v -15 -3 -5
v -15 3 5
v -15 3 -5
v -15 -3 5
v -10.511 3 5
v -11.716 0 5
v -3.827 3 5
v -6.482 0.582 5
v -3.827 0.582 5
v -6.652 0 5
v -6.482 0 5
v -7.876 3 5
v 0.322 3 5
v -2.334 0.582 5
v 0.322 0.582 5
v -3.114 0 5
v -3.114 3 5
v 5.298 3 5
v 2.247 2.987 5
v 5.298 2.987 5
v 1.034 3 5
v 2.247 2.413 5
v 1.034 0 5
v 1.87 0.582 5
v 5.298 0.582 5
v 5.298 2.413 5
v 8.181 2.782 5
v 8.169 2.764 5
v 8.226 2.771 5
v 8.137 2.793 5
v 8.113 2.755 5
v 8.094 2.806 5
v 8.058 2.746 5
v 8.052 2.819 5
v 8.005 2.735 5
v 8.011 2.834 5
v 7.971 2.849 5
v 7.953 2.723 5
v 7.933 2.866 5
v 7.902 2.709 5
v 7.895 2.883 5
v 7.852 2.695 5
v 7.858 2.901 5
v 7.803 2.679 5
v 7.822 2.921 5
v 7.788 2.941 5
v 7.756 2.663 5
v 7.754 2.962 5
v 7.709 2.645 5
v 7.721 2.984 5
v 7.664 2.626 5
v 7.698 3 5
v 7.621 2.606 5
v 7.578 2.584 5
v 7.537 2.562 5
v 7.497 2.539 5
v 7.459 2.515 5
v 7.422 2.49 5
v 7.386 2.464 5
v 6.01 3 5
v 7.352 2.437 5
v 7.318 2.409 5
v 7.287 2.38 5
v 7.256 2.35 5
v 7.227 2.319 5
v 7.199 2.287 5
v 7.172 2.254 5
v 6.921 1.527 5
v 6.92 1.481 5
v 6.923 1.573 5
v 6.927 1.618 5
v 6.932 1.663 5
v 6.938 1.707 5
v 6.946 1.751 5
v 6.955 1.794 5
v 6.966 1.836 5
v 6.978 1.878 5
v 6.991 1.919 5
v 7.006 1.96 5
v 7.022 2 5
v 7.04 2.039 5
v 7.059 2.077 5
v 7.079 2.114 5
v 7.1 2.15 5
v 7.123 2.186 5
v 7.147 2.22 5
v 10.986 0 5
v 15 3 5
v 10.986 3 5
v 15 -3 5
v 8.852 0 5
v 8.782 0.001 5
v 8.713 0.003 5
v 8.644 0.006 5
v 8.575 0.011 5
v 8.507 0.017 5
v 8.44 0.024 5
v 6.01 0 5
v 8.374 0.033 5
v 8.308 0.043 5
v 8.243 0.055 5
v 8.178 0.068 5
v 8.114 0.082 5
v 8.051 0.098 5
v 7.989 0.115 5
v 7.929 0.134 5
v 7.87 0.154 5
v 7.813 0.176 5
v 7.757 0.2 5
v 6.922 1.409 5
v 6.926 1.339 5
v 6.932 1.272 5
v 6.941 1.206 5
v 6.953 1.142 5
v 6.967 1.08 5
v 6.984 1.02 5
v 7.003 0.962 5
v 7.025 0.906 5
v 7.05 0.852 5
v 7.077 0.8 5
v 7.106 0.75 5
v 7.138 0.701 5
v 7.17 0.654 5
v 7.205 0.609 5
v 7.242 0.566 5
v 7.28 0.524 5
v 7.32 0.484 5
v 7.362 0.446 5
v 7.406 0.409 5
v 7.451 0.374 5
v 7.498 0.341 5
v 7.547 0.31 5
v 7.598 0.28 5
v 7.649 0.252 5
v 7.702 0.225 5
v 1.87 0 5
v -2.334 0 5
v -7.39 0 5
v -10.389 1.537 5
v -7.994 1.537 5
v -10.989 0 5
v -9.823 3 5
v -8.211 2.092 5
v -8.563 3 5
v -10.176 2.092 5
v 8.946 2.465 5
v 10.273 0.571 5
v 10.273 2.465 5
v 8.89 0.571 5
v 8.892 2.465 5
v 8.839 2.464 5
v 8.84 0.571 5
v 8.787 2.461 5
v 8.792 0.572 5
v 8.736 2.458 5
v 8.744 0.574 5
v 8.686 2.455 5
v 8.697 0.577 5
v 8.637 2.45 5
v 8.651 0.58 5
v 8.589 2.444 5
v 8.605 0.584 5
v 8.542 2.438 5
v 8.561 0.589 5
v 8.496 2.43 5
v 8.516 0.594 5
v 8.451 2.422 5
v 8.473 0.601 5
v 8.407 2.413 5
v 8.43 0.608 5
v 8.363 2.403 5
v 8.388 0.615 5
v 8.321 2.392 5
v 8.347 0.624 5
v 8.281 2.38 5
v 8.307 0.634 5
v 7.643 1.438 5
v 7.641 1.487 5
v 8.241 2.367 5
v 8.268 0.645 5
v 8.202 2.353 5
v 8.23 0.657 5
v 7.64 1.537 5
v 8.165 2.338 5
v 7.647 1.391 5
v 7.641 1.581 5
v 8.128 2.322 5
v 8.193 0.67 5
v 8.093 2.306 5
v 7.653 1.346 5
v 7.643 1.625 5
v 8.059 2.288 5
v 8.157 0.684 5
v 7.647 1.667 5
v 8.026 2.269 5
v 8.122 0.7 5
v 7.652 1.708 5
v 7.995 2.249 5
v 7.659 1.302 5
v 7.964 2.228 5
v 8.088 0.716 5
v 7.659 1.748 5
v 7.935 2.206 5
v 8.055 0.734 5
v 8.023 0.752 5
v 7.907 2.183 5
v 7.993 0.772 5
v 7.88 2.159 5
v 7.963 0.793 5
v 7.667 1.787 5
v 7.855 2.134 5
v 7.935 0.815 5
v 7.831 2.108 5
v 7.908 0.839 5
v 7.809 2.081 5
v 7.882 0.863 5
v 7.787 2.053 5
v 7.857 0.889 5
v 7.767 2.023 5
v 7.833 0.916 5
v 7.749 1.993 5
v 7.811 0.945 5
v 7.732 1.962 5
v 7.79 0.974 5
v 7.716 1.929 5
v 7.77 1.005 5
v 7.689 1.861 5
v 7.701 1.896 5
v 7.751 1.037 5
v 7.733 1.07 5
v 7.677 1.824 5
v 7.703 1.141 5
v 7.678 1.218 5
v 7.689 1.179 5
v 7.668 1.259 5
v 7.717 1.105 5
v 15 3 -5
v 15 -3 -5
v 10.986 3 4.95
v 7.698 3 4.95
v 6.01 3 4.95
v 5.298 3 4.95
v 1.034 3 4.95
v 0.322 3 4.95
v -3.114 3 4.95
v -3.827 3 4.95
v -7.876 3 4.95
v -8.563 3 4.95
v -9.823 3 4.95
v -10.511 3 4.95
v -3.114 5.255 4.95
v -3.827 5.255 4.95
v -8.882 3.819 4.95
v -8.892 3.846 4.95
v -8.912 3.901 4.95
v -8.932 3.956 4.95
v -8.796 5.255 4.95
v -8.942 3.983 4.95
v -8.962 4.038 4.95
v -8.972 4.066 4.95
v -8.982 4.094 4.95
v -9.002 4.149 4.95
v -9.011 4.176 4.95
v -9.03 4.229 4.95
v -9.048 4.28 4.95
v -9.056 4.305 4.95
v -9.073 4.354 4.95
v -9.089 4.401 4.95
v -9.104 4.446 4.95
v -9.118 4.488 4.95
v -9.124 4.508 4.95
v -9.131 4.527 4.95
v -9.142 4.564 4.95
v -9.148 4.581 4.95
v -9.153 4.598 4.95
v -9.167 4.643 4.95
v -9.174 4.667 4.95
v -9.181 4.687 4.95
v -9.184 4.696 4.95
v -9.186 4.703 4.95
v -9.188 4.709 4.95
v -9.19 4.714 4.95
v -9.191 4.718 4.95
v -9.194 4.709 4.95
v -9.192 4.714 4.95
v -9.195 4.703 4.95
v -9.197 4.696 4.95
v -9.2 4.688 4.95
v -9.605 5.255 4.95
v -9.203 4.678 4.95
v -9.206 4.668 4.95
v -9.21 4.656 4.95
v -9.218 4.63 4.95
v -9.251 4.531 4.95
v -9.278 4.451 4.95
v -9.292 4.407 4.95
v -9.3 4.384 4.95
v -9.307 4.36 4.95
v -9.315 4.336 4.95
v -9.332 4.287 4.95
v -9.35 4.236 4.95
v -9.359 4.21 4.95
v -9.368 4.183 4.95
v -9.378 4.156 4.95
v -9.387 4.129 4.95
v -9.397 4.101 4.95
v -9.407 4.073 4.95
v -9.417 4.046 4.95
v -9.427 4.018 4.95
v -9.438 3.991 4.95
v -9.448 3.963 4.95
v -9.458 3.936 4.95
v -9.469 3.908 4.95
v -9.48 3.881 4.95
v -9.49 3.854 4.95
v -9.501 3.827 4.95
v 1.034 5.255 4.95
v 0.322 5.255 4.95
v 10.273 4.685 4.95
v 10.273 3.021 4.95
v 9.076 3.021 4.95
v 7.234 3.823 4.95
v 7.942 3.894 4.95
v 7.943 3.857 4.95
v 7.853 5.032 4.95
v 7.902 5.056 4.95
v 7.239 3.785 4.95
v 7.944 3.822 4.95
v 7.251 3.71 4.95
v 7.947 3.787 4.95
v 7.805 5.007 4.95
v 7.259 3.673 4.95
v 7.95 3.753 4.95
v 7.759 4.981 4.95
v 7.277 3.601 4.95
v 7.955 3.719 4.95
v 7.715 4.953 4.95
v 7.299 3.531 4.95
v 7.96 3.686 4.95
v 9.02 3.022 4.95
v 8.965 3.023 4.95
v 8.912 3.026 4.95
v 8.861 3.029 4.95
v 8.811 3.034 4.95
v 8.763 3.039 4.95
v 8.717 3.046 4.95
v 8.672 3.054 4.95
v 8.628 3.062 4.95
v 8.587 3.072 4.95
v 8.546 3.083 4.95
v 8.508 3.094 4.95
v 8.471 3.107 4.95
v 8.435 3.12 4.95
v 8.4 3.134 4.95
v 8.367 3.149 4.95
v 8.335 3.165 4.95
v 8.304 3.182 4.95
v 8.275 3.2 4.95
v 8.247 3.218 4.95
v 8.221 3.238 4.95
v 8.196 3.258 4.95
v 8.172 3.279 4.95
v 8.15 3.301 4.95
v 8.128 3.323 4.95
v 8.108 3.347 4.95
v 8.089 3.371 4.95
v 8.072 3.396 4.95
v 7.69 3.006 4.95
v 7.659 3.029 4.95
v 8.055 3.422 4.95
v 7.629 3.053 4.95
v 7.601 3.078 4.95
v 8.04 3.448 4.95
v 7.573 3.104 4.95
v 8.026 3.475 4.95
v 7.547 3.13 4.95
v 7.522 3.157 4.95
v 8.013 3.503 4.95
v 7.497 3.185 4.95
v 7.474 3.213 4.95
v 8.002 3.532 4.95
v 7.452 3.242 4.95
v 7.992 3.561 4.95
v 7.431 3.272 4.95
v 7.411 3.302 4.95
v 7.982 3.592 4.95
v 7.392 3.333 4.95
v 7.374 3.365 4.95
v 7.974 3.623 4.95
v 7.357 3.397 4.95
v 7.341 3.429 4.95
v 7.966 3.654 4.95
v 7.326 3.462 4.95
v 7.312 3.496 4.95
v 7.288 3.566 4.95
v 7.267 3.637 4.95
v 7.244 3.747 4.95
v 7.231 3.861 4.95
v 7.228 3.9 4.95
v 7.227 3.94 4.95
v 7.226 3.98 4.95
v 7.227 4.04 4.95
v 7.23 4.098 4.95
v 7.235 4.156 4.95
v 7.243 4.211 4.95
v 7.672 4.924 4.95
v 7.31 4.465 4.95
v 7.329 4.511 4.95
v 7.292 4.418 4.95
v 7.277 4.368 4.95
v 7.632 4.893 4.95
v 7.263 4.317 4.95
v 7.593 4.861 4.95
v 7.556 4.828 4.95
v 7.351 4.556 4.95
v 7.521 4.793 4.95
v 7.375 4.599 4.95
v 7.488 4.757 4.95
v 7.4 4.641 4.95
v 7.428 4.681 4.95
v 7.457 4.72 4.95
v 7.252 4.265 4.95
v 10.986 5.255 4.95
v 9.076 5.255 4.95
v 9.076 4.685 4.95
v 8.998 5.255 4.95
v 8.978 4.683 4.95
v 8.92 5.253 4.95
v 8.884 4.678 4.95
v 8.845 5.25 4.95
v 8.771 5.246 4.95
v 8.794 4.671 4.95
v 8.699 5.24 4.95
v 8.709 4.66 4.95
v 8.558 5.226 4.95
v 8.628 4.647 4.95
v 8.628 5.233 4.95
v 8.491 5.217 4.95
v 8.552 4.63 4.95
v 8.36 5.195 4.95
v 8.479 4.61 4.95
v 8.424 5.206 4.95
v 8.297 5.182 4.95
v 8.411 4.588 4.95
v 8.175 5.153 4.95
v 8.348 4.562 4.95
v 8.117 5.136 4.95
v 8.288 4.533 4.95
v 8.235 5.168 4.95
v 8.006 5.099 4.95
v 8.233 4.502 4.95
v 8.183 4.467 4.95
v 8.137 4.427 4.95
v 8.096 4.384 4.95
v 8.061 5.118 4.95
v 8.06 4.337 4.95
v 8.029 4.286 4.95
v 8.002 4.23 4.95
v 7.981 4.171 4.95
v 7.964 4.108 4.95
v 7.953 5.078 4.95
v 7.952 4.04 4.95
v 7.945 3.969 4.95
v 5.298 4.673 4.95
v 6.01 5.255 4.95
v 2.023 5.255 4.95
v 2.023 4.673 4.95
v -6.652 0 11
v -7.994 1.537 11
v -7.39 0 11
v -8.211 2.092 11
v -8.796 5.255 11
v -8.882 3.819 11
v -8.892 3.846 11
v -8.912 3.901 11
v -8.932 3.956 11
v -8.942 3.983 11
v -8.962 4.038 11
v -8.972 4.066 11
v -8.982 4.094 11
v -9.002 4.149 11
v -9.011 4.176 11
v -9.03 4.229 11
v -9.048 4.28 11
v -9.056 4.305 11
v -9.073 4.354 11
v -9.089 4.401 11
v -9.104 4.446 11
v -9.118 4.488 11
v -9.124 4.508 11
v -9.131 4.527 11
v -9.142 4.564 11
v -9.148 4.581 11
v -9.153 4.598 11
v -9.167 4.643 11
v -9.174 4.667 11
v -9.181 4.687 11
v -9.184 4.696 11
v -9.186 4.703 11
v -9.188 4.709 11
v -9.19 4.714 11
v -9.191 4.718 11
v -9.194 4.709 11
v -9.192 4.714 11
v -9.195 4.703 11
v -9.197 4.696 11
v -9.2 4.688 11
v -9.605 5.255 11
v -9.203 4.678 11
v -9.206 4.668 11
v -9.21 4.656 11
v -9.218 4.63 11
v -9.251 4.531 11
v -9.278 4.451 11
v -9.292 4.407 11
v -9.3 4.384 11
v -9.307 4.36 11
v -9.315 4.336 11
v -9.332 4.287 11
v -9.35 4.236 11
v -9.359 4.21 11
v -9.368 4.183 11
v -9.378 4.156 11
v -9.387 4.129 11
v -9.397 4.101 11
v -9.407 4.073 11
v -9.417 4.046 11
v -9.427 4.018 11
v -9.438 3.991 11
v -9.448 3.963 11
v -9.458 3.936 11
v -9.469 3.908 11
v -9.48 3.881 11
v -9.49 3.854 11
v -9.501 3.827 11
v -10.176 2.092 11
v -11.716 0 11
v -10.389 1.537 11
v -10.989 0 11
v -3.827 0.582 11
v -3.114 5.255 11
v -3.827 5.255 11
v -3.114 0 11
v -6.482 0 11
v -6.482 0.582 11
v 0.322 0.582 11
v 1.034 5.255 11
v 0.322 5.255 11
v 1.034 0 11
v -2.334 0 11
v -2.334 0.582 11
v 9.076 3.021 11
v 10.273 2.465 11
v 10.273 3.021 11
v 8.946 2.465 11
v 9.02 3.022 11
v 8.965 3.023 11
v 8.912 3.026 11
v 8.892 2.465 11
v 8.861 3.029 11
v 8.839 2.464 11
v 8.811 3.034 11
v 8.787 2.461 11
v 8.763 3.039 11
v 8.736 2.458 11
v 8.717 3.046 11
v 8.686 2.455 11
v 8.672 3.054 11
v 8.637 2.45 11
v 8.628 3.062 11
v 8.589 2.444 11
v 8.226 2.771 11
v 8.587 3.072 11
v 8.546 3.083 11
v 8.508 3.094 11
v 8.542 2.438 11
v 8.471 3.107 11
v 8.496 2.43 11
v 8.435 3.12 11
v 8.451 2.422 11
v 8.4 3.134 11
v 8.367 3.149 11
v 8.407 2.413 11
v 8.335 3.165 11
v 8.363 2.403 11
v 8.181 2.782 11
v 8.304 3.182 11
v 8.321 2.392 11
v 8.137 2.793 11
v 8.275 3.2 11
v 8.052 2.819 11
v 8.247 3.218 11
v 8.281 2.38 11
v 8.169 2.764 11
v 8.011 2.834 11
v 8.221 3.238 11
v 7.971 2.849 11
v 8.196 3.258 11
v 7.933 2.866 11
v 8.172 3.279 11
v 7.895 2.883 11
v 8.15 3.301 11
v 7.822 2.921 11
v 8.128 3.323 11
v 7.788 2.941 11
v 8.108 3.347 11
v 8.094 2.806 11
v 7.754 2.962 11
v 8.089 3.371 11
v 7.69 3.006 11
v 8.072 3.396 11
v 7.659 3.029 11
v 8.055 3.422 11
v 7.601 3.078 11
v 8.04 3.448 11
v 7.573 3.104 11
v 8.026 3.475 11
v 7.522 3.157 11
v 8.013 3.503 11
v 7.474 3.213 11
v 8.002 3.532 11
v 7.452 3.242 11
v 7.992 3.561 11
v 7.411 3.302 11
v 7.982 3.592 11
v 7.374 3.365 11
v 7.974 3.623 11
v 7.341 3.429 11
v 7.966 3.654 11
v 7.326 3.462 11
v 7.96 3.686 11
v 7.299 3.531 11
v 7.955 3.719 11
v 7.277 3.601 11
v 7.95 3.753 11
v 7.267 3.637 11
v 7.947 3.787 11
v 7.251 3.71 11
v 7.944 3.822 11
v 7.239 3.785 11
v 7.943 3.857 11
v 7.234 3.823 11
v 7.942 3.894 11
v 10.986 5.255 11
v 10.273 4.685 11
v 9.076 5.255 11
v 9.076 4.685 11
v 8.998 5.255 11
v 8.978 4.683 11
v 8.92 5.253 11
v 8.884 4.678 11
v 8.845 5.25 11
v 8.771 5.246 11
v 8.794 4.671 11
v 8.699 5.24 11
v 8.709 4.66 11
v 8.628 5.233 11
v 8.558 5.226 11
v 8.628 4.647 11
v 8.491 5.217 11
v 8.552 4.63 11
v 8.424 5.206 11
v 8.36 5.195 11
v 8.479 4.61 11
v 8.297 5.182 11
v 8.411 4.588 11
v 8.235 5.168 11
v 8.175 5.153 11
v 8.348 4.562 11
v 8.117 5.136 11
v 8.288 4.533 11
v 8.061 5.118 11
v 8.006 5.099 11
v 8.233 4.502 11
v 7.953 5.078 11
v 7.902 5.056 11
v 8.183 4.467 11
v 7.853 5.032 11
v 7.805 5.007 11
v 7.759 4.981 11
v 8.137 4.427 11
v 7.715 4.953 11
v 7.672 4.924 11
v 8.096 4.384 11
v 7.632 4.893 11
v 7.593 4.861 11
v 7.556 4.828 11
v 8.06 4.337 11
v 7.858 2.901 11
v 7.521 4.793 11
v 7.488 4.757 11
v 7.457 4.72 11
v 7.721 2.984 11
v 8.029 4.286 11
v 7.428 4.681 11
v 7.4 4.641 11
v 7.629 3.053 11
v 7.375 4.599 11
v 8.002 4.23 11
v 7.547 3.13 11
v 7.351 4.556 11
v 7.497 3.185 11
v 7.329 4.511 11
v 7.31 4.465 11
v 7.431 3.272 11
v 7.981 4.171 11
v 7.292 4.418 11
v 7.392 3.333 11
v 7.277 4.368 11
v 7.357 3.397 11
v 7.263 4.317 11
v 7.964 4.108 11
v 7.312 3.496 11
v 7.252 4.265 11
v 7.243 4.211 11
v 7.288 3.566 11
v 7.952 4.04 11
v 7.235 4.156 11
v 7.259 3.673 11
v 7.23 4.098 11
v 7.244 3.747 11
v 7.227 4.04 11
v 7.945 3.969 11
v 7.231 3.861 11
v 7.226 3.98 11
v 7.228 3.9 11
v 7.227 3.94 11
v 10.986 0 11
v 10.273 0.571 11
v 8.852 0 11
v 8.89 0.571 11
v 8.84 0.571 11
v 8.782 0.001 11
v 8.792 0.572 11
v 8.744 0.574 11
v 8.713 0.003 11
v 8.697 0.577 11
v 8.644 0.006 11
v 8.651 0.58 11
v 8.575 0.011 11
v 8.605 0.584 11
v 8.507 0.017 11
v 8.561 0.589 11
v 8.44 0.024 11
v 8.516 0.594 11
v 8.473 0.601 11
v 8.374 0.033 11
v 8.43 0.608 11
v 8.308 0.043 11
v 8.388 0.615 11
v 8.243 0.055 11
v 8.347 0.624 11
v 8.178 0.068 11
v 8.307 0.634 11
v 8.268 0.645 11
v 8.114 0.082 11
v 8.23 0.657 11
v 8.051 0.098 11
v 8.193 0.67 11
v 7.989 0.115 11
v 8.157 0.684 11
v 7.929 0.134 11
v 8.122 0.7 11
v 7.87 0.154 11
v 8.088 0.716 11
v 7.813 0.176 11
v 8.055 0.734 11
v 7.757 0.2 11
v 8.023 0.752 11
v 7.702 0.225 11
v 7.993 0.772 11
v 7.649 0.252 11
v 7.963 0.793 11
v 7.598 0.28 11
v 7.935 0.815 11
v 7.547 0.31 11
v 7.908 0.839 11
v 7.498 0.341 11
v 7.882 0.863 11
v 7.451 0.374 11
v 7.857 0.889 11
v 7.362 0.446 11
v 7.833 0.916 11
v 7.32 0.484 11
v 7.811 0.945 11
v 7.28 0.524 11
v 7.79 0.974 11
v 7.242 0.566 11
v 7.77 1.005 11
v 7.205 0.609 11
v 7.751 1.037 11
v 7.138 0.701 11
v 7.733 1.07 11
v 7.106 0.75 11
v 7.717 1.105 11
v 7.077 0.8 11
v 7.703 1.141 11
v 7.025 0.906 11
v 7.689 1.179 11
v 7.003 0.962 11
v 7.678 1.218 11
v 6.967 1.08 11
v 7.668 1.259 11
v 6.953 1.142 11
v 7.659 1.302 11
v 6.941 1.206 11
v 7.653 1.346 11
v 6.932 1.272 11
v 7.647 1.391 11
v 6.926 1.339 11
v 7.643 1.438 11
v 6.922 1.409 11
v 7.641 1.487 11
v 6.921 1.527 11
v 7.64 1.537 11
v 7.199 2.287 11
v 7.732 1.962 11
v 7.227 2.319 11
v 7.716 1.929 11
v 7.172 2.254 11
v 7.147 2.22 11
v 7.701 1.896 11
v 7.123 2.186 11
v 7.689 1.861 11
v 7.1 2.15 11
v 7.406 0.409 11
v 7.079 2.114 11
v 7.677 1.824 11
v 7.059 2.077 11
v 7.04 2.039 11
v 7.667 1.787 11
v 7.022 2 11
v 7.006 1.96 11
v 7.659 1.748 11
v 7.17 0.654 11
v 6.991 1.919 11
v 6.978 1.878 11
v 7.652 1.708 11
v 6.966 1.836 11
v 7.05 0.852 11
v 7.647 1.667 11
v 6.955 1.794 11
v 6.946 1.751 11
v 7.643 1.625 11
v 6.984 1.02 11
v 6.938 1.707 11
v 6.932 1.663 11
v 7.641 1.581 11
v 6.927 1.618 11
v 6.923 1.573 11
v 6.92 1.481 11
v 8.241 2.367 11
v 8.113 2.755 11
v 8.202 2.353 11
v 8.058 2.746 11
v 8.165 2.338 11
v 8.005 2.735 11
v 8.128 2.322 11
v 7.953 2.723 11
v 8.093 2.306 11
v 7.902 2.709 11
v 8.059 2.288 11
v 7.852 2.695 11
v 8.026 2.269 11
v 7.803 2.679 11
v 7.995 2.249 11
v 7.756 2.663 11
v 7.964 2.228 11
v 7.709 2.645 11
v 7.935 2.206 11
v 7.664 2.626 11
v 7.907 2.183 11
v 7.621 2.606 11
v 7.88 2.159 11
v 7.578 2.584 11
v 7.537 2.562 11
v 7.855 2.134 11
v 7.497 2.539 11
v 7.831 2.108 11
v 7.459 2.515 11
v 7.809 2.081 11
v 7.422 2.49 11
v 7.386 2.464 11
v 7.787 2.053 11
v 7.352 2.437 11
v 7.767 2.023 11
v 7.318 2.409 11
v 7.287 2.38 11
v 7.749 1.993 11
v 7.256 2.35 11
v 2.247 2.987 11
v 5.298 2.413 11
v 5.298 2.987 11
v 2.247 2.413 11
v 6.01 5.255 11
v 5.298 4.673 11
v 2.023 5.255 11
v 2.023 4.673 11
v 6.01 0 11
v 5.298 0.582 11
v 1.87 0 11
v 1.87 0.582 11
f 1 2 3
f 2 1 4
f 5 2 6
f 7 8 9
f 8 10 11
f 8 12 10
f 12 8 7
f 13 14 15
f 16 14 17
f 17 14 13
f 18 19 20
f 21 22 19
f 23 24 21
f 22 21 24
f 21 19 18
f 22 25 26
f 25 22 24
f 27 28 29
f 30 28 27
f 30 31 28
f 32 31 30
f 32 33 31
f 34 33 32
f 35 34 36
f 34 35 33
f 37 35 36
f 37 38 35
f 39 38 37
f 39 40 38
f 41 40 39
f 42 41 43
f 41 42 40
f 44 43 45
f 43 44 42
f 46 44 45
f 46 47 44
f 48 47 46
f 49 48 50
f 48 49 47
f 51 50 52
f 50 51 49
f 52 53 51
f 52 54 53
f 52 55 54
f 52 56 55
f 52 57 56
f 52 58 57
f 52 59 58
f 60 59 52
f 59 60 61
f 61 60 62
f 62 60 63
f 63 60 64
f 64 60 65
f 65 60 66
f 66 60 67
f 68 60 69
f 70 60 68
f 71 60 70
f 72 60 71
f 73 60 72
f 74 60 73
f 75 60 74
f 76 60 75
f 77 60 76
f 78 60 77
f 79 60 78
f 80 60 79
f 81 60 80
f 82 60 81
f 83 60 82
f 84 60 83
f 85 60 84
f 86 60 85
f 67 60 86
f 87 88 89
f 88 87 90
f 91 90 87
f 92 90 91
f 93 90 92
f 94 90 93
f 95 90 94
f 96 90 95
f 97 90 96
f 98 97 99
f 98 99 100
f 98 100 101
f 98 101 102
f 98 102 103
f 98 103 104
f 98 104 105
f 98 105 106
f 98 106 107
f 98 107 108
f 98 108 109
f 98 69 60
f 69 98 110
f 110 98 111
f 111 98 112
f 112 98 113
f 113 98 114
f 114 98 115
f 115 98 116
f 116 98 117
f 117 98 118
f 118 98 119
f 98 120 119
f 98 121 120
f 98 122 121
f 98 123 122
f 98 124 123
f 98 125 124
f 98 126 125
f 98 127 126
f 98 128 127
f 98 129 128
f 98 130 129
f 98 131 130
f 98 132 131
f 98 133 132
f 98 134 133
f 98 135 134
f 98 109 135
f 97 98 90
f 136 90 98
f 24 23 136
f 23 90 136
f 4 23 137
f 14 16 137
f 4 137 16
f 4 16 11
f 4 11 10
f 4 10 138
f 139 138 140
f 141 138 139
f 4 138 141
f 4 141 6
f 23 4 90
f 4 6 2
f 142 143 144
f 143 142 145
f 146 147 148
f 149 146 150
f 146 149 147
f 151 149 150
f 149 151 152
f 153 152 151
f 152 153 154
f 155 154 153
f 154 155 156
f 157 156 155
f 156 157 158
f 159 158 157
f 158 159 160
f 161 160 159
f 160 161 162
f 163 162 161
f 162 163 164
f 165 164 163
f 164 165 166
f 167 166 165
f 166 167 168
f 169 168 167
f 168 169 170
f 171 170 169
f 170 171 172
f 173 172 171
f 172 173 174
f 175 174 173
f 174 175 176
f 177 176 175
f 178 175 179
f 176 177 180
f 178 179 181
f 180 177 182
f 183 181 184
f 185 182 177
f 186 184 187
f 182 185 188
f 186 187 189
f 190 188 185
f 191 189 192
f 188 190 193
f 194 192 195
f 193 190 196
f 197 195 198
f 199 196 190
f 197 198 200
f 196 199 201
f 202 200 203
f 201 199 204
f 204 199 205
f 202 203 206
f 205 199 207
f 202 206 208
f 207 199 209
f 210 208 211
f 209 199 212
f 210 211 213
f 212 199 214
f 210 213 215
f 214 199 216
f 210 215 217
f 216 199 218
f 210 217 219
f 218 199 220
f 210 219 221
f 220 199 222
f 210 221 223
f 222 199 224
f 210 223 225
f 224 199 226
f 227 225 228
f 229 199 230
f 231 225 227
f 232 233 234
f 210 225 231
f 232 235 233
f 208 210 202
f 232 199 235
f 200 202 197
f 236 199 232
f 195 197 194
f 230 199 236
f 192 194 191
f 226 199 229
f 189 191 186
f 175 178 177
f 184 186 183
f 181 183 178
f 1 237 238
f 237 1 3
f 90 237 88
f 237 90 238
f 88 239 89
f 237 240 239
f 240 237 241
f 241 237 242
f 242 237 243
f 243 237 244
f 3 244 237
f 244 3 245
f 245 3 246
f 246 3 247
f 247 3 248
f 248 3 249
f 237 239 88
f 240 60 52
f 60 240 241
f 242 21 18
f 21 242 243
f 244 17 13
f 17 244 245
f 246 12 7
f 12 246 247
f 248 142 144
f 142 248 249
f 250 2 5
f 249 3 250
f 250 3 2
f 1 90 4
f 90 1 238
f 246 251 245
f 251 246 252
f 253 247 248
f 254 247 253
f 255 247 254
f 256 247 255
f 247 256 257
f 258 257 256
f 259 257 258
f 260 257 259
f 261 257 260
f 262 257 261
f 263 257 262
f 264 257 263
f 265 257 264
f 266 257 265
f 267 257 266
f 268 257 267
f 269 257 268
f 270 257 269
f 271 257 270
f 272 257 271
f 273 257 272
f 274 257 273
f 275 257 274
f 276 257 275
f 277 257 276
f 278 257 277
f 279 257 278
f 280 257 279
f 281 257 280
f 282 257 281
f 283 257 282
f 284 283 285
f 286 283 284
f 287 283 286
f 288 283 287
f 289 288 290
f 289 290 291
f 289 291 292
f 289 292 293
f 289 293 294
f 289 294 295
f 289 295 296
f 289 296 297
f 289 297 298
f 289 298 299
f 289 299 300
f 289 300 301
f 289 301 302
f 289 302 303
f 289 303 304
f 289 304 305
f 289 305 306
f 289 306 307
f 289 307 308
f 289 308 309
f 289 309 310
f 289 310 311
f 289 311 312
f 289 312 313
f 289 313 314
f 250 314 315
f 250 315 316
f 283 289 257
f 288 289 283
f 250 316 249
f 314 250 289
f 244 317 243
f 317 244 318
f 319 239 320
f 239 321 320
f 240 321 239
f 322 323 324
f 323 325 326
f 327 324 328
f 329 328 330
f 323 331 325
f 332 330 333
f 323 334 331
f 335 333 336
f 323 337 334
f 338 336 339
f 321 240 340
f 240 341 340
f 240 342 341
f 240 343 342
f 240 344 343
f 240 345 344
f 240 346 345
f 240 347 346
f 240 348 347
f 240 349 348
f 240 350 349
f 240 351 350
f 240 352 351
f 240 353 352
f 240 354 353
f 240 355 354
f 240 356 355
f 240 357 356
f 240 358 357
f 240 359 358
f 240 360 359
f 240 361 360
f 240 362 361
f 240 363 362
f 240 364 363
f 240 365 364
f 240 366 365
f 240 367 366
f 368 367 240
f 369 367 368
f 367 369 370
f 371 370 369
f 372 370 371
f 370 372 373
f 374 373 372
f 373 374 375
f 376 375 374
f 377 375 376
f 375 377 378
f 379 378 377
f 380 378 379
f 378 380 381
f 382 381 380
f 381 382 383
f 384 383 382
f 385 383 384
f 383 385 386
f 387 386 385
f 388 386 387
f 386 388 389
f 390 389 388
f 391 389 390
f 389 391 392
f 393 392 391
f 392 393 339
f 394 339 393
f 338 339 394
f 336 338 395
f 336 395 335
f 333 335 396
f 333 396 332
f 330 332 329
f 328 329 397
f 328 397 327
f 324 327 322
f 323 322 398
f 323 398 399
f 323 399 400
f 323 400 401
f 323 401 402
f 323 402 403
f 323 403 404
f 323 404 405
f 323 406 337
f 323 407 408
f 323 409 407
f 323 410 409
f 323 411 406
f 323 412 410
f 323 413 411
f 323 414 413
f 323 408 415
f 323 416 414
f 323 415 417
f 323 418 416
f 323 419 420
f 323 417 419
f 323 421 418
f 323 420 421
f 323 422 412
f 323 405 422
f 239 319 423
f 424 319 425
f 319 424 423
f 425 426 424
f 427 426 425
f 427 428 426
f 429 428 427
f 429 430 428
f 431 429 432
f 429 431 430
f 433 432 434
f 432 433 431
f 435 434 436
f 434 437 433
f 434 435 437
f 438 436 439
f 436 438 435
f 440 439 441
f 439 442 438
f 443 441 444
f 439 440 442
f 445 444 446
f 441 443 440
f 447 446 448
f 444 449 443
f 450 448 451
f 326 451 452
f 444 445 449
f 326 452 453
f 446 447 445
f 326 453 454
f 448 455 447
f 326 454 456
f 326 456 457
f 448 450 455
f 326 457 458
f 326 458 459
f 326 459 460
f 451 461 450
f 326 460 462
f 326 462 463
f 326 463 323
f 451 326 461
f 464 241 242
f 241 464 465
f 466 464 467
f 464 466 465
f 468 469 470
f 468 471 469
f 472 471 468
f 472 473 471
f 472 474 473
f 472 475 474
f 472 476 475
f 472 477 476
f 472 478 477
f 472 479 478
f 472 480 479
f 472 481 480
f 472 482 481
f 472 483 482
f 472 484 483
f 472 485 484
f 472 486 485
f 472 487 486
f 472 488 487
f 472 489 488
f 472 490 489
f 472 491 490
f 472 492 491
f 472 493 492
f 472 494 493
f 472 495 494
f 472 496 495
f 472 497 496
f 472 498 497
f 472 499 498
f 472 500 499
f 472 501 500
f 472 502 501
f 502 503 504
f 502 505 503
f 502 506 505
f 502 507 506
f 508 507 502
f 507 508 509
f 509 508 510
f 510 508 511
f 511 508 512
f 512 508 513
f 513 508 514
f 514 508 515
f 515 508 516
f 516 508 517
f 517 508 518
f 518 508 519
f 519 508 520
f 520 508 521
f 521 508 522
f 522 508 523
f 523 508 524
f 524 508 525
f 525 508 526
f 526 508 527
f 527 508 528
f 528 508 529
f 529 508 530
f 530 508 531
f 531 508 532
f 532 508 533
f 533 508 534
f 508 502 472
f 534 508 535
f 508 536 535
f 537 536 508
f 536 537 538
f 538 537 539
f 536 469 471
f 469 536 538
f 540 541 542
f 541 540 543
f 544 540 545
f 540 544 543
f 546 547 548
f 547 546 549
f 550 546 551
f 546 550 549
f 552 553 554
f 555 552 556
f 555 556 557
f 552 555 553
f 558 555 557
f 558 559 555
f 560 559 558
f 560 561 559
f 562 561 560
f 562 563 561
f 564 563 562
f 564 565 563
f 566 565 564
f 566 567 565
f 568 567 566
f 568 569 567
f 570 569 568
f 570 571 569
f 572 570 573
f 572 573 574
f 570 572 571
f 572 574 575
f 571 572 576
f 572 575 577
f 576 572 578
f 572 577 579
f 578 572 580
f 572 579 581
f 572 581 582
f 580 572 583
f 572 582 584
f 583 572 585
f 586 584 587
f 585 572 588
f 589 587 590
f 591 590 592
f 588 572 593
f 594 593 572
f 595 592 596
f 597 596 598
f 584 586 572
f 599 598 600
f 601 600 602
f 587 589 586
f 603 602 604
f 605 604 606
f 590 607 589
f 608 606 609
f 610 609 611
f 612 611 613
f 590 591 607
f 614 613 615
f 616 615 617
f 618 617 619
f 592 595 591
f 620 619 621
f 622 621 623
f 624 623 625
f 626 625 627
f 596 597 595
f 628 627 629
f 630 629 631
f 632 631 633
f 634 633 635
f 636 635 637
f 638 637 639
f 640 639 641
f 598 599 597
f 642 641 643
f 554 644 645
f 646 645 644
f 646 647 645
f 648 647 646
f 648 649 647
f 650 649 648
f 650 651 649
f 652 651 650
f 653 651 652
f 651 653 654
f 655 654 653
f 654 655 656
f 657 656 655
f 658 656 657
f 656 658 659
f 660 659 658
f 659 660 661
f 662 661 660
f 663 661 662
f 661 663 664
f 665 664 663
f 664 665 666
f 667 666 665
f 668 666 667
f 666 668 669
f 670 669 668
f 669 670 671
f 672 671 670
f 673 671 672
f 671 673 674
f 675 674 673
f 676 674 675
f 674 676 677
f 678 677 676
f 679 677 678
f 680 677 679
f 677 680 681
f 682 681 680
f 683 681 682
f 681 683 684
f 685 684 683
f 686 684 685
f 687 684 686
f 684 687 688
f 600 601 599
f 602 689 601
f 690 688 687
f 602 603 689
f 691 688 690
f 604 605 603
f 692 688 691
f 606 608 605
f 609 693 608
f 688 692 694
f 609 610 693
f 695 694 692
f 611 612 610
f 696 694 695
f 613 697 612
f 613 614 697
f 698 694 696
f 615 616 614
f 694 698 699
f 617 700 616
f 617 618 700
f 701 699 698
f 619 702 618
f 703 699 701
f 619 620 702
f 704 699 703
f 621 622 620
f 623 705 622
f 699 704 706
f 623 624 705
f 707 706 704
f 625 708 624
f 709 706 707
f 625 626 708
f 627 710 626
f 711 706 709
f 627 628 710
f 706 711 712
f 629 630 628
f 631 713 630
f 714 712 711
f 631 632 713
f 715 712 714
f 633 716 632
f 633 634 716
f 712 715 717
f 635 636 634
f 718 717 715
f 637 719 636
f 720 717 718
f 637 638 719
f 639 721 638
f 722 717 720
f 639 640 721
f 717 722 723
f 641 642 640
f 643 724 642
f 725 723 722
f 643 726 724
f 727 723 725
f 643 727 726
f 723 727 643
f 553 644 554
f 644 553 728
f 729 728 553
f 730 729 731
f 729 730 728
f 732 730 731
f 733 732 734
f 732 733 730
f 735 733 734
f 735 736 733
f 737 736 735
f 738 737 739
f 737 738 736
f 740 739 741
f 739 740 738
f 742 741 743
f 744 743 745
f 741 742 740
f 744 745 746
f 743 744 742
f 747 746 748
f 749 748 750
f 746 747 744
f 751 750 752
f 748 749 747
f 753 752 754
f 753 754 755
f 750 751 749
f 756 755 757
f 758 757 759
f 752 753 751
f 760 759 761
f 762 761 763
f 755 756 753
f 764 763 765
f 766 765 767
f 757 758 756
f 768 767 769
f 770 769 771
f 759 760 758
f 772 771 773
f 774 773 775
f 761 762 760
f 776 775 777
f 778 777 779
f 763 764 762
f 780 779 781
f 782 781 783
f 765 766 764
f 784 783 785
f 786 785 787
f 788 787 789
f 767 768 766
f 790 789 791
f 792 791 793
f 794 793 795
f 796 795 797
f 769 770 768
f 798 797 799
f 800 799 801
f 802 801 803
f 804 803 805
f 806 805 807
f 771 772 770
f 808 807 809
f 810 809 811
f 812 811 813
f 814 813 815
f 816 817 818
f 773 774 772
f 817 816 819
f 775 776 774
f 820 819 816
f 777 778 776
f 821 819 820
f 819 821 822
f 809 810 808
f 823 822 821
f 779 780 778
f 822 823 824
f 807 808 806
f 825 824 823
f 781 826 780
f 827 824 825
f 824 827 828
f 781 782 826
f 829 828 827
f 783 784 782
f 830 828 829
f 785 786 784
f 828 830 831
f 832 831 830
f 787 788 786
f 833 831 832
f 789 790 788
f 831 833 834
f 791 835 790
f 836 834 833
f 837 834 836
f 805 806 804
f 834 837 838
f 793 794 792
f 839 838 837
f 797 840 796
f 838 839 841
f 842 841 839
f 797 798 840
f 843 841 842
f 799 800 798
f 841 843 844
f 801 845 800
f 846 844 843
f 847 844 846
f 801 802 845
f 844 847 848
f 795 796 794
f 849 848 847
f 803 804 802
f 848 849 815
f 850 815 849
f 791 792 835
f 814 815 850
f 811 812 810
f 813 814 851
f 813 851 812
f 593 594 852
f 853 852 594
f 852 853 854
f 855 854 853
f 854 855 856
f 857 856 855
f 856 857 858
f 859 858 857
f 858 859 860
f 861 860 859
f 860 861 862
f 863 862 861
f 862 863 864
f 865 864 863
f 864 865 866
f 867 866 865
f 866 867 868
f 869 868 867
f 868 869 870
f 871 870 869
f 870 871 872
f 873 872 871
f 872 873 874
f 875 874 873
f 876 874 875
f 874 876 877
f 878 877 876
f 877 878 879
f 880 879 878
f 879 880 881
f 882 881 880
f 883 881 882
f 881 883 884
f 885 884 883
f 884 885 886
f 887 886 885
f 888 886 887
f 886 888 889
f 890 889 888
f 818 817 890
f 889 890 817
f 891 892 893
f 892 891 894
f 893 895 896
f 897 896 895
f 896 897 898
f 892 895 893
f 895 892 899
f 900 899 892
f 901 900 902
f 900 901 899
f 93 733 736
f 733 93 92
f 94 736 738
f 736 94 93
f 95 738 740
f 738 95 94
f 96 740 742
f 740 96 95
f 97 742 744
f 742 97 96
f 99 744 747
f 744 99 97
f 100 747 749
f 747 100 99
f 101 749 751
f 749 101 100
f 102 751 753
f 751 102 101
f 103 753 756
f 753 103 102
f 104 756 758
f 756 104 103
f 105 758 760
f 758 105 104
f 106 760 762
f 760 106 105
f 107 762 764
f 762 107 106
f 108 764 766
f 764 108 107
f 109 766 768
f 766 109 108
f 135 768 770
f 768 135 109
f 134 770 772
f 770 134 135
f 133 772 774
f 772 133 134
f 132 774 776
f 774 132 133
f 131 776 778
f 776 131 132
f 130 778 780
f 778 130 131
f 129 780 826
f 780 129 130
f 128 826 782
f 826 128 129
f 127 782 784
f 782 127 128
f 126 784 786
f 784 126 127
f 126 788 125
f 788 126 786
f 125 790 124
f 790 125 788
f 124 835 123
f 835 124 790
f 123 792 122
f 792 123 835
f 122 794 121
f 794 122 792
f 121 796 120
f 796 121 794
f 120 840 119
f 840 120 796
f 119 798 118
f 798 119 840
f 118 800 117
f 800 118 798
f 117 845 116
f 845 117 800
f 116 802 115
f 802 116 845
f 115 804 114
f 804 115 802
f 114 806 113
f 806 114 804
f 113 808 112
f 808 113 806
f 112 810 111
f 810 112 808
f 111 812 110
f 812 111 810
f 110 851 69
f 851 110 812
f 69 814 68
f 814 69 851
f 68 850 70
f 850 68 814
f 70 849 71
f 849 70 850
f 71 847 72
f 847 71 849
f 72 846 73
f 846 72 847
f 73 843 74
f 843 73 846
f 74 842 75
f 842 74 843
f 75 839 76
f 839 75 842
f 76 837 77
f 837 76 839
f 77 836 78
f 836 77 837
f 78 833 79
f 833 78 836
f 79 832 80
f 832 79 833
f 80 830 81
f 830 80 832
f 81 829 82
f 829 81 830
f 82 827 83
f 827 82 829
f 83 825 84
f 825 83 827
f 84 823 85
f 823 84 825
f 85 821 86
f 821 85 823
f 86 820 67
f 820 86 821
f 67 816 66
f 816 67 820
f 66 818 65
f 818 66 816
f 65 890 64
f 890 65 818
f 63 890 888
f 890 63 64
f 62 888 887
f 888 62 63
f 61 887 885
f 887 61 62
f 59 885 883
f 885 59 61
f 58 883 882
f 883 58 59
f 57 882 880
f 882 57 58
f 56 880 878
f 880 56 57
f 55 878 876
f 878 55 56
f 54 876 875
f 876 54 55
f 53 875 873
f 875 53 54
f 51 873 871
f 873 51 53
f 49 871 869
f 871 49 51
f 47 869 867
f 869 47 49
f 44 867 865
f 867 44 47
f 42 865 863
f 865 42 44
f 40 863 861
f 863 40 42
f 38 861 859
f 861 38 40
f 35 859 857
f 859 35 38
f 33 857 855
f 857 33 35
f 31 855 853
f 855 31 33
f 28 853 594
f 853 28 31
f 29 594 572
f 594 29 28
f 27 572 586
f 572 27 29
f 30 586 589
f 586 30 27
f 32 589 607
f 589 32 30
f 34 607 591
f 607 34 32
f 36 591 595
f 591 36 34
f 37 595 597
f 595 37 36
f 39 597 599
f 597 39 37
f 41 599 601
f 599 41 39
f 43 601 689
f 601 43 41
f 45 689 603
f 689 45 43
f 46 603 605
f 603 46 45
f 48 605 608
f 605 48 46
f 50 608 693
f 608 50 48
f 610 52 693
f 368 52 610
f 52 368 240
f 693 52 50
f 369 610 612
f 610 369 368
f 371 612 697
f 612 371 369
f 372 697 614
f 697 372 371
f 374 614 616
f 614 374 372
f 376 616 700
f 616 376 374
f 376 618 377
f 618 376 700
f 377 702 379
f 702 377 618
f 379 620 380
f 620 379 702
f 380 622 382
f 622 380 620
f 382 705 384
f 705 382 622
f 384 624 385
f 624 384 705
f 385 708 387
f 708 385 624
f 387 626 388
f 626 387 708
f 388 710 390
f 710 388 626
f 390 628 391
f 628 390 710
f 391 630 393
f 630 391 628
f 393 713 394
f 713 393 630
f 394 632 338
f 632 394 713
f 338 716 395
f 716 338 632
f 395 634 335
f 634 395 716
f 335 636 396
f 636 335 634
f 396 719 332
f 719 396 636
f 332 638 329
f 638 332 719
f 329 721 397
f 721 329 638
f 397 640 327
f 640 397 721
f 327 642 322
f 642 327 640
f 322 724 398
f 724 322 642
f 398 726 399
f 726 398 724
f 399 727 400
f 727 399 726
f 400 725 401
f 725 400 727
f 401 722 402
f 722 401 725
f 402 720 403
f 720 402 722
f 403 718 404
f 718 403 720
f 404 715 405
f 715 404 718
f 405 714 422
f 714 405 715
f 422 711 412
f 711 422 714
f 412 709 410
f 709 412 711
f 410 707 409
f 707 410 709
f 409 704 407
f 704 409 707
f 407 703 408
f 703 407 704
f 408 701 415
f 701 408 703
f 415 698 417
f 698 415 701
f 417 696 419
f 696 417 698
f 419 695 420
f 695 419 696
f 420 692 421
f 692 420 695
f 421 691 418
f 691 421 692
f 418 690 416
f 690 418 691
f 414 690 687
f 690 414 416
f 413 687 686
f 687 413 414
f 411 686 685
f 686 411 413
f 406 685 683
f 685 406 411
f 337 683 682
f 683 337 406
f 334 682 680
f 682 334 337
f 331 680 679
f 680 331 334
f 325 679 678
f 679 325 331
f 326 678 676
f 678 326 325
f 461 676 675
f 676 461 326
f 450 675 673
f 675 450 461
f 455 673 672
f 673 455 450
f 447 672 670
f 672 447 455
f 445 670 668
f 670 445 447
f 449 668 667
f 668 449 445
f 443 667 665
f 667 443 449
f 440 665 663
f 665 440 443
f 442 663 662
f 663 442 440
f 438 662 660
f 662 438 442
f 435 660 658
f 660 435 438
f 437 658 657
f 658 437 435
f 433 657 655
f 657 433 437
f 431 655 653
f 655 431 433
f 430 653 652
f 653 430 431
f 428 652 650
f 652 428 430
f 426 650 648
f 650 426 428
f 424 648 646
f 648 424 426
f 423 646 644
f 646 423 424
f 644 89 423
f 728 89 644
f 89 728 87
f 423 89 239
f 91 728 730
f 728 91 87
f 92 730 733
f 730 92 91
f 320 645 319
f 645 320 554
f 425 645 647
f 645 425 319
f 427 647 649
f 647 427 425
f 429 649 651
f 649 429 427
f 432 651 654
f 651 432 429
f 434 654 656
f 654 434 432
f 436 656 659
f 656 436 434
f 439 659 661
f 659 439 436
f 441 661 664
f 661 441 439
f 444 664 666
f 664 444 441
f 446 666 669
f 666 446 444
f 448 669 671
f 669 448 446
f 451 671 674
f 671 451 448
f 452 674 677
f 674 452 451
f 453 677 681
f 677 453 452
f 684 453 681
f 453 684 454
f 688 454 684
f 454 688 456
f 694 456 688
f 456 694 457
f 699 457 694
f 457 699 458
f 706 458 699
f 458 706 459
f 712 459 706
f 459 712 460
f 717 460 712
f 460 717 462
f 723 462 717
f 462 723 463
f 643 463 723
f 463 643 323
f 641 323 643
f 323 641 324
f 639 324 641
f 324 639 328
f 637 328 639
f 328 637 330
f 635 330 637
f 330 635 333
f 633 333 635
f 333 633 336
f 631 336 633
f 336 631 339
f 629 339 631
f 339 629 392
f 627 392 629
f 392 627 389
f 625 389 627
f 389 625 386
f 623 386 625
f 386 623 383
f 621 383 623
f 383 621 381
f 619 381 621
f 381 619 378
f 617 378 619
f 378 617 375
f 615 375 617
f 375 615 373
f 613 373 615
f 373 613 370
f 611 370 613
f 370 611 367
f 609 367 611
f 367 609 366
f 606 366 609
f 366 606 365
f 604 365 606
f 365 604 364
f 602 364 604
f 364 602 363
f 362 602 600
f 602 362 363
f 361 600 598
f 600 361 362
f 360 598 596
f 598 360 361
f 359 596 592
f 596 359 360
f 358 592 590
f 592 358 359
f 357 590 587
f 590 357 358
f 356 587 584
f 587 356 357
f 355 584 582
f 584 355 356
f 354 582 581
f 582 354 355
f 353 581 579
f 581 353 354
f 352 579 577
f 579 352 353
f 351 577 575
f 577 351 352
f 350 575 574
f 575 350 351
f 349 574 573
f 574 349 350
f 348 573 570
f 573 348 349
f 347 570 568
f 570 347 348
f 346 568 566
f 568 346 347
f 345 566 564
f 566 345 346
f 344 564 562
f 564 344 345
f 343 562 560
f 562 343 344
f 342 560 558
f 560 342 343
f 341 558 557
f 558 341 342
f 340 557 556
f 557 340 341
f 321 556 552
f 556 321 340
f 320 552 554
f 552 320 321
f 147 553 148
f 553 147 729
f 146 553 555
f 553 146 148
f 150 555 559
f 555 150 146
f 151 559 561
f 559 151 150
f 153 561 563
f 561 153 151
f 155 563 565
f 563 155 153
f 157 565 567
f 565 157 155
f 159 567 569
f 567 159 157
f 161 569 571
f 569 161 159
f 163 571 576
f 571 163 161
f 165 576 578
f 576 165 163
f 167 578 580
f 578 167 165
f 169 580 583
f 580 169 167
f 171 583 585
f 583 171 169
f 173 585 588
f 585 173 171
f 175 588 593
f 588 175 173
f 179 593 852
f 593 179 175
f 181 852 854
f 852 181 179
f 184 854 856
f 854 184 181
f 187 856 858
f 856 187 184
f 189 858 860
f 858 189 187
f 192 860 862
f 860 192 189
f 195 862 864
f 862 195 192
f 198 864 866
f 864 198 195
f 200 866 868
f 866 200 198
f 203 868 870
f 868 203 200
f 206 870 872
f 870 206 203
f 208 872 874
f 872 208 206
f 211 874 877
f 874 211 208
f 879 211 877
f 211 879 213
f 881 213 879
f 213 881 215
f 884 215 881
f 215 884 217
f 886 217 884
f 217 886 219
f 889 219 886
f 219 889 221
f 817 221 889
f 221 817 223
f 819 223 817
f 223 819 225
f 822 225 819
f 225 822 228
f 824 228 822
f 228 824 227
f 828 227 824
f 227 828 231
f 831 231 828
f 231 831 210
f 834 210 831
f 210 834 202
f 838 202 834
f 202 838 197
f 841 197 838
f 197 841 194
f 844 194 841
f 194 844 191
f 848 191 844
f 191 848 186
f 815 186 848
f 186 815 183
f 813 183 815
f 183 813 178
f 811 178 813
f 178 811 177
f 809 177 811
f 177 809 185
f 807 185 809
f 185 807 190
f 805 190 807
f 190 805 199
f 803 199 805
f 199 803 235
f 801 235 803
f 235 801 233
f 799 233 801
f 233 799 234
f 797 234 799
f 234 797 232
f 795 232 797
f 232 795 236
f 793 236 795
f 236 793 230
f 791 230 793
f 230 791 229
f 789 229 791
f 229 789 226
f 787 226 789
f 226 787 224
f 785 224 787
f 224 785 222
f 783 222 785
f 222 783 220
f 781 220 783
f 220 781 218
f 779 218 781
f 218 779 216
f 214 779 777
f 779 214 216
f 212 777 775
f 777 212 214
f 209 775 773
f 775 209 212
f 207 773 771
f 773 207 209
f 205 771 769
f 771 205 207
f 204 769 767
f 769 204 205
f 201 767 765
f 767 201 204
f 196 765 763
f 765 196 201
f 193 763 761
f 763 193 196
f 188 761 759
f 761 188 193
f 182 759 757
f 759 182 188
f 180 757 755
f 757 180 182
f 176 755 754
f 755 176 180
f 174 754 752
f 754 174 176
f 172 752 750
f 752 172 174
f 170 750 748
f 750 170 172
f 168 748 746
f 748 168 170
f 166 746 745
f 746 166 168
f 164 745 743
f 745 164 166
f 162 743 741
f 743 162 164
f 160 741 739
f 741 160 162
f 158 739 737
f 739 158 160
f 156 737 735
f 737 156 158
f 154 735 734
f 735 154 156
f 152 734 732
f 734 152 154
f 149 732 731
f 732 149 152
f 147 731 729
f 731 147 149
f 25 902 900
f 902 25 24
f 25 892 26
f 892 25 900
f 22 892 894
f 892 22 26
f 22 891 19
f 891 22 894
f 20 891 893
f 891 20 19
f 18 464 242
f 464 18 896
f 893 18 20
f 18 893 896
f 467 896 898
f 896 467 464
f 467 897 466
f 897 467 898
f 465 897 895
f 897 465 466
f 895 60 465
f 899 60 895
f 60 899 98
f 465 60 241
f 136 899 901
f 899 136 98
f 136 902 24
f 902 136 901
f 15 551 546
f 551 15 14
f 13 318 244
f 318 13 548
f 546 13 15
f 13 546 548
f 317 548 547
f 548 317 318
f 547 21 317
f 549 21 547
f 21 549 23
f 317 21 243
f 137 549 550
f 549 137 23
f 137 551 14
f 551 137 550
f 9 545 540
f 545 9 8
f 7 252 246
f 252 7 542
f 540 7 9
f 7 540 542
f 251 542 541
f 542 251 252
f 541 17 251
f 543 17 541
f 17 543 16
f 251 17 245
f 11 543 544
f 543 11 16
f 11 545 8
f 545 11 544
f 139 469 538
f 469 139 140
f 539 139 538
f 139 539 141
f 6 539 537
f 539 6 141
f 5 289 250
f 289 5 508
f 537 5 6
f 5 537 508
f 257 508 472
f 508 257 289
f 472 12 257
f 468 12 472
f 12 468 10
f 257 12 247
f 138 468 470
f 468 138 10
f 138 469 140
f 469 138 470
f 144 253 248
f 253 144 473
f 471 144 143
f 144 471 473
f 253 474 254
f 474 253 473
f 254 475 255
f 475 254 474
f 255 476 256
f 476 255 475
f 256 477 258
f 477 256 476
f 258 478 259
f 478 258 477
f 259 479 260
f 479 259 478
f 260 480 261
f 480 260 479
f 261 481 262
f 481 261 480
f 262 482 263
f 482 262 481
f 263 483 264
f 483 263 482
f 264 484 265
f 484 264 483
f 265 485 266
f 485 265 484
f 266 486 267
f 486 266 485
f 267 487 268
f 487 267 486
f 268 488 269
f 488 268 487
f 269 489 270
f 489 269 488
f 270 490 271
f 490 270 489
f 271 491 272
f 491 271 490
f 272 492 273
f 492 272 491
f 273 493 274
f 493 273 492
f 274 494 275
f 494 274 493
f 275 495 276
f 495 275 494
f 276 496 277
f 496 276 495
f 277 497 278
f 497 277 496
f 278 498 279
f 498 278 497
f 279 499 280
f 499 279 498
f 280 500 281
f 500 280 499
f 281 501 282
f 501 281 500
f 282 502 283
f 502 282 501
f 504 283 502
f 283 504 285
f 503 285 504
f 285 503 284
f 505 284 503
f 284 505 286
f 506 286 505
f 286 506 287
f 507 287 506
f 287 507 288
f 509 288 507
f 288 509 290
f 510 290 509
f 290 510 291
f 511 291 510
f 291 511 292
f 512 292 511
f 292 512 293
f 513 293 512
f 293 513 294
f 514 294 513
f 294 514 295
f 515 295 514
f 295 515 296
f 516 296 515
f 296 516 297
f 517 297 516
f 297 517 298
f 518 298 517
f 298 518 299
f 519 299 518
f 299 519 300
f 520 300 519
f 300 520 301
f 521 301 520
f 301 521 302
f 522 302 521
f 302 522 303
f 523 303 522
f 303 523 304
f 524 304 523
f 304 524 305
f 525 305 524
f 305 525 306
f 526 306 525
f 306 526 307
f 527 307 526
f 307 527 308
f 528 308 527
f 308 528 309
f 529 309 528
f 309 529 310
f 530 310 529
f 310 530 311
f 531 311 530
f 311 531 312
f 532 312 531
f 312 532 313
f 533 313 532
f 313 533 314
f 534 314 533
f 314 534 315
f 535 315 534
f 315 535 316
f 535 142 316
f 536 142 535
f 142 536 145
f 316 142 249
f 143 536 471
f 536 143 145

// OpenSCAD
// stamp_template.scad — 参数化名字印章模板
//
// 设计要点：
//   1. 所有参数用 is_undef 三元式声明，既可被命令行 -D 覆盖，
//      也可直接在 OpenSCAD 中打开预览（此时取默认值）。
//   2. 文字与底座留 0.05mm 重叠，避免共面产生非流形边。
//   3. 整体沿 YZ 平面镜像，压印后文字为正读。
//   4. $fa/$fs 取代 $fn，按弦高控制曲面精度，避免字母曲面过度细分。

name           = is_undef(name)           ? "BELLA"   : name;
base_len       = is_undef(base_len)       ? 30        : base_len;
base_width     = is_undef(base_width)     ? 6         : base_width;
base_height    = is_undef(base_height)    ? 10        : base_height;
letter_size    = is_undef(letter_size)    ? 5.5       : letter_size;
letter_spacing = is_undef(letter_spacing) ? 1.0       : letter_spacing;
letter_height  = is_undef(letter_height)  ? 6         : letter_height;
font_family    = is_undef(font_family)    ? "Arial"   : font_family;
font_style     = is_undef(font_style)     ? "Regular" : font_style;
weight_offset  = is_undef(weight_offset)  ? 0         : weight_offset;
text_offset_y  = is_undef(text_offset_y)  ? 0         : text_offset_y;
curve_fa       = is_undef(curve_fa)       ? 4         : curve_fa;
curve_fs       = is_undef(curve_fs)       ? 0.4       : curve_fs;

$fa = curve_fa;
$fs = curve_fs;

overlap = 0.05;

module glyphs_2d() {
    // valign="baseline" 让文字基线落在 y=0，
    // 再由 text_offset_y 把「大写字高带」的中心移到原点，
    // 这样换任何字体都能保持光学居中。
    translate([0, text_offset_y, 0])
        text(name,
             size    = letter_size,
             font    = str(font_family, ":style=", font_style),
             spacing = letter_spacing,
             halign  = "center",
             valign  = "baseline");
}

module glyphs_weighted_2d() {
    if (weight_offset > 0.001)
        offset(delta = weight_offset) glyphs_2d();
    else
        glyphs_2d();
}

module stamp_body() {
    union() {
        cube([base_len, base_width, base_height], center = true);
        translate([0, 0, base_height / 2 - overlap])
            linear_extrude(height = letter_height + overlap)
                glyphs_weighted_2d();
    }
}

mirror([1, 0, 0]) stamp_body();
